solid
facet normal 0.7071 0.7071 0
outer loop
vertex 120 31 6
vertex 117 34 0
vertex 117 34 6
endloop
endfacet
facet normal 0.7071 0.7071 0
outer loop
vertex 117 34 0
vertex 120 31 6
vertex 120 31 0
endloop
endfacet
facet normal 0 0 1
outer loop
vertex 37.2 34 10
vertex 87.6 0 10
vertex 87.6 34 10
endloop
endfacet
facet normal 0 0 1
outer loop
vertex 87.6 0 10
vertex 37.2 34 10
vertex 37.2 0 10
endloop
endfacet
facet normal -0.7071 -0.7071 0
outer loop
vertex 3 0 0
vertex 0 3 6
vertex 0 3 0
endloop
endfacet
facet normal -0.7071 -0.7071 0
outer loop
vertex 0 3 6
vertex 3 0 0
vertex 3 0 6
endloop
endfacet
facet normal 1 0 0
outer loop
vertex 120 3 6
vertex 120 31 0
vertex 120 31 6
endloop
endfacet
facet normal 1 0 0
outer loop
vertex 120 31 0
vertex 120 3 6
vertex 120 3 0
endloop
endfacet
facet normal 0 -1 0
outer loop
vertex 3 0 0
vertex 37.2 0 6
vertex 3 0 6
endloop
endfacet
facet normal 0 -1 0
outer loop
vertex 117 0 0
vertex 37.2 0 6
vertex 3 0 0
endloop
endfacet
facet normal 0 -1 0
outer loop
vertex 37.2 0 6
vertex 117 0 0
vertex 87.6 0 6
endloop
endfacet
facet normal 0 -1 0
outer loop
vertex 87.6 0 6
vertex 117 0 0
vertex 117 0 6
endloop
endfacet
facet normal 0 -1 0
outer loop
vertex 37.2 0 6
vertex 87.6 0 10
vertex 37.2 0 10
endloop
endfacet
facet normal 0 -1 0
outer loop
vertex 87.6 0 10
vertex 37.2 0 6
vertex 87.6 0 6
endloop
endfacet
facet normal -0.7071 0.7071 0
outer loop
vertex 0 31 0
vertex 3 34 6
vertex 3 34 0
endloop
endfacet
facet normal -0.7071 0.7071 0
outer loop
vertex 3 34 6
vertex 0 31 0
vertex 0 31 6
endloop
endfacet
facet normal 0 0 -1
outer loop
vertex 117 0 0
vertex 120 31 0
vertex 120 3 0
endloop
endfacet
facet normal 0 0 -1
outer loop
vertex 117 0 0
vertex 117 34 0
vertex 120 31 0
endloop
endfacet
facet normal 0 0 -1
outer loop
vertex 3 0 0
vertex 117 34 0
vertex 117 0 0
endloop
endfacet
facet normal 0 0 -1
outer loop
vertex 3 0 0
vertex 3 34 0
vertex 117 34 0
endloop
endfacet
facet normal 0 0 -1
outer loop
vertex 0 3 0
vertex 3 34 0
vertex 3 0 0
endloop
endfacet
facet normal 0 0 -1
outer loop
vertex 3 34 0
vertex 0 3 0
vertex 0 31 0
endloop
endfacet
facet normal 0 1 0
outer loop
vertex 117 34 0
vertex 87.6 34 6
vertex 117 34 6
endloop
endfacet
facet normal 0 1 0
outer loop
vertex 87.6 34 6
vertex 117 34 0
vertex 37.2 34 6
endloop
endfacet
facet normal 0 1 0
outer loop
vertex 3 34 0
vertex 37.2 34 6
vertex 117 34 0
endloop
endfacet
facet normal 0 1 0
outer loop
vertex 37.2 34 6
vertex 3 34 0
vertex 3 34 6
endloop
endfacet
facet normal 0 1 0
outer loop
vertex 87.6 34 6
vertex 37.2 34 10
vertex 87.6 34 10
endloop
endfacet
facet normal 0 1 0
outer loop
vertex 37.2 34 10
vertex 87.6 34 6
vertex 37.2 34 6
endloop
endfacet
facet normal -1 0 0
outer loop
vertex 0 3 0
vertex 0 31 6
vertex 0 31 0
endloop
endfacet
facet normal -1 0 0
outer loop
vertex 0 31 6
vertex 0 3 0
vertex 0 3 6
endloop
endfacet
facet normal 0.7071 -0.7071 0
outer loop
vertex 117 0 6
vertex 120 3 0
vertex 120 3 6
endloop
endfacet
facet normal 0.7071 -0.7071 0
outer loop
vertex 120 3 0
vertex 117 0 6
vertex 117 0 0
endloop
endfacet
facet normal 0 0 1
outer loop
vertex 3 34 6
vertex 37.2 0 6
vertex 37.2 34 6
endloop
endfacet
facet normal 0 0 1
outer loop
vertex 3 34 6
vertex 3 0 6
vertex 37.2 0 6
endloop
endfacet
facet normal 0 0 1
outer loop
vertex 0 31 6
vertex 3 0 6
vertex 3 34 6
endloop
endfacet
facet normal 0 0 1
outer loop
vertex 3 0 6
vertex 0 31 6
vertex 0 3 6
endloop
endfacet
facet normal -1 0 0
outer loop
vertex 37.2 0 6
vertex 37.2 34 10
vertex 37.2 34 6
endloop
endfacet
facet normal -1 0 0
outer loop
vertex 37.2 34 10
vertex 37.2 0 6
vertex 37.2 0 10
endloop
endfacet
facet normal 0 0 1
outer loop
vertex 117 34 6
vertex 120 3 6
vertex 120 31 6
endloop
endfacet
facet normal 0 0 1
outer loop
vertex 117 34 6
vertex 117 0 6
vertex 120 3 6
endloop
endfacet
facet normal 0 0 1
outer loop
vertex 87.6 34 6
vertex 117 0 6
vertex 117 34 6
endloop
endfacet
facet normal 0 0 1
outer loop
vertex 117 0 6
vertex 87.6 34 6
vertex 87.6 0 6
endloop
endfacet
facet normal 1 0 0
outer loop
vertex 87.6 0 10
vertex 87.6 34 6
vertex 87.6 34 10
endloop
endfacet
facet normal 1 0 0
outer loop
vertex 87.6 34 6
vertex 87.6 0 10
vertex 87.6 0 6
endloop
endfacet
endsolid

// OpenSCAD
$fn = 32;

// ----------------------------------------------------------------------
// Stepped bar: centerstep, 120 x 34 x 10/6 mm
// ----------------------------------------------------------------------

// --- parameters (mm) ---
bar_l = 120;              // bar length, X
bar_w = 34;               // bar width, Y
plate_t = 10;             // thickness of the thick zone, Z
thin_t = 6;               // thickness of the thin zone
corner_c = 3;             // corner chamfer of the bar
step_cut = 4;             // material removed from the thin zone
thick_from = 37.2;        // start of the thick middle zone
thick_to = 87.6;          // end of the thick middle zone
depth_1 = 4;              // depth of cut 1 from the top face
depth_2 = 4;              // depth of cut 2 from the top face
fit_tol = 0.1;            // declared fit tolerance (prompt contract)
free_tol = 0.3;           // declared free tolerance (prompt contract)

profile = [[3, 0], [117, 0], [120, 3], [120, 31], [117, 34], [3, 34], [0, 31], [0, 3]];  // primary outline, 8 points, counter clockwise
void_1 = [[-1, -1], [37.2, -1], [37.2, 35], [-1, 35]];  // thin left end, 4 points
void_2 = [[87.6, -1], [121, -1], [121, 35], [87.6, 35]];  // thin right end, 4 points

// --- the one profile operation ---
difference() {
  linear_extrude(height = plate_t) polygon(points = profile);
  translate([0, 0, plate_t - depth_1])
    linear_extrude(height = depth_1 + 1) polygon(points = void_1);
  translate([0, 0, plate_t - depth_2])
    linear_extrude(height = depth_2 + 1) polygon(points = void_2);
}
